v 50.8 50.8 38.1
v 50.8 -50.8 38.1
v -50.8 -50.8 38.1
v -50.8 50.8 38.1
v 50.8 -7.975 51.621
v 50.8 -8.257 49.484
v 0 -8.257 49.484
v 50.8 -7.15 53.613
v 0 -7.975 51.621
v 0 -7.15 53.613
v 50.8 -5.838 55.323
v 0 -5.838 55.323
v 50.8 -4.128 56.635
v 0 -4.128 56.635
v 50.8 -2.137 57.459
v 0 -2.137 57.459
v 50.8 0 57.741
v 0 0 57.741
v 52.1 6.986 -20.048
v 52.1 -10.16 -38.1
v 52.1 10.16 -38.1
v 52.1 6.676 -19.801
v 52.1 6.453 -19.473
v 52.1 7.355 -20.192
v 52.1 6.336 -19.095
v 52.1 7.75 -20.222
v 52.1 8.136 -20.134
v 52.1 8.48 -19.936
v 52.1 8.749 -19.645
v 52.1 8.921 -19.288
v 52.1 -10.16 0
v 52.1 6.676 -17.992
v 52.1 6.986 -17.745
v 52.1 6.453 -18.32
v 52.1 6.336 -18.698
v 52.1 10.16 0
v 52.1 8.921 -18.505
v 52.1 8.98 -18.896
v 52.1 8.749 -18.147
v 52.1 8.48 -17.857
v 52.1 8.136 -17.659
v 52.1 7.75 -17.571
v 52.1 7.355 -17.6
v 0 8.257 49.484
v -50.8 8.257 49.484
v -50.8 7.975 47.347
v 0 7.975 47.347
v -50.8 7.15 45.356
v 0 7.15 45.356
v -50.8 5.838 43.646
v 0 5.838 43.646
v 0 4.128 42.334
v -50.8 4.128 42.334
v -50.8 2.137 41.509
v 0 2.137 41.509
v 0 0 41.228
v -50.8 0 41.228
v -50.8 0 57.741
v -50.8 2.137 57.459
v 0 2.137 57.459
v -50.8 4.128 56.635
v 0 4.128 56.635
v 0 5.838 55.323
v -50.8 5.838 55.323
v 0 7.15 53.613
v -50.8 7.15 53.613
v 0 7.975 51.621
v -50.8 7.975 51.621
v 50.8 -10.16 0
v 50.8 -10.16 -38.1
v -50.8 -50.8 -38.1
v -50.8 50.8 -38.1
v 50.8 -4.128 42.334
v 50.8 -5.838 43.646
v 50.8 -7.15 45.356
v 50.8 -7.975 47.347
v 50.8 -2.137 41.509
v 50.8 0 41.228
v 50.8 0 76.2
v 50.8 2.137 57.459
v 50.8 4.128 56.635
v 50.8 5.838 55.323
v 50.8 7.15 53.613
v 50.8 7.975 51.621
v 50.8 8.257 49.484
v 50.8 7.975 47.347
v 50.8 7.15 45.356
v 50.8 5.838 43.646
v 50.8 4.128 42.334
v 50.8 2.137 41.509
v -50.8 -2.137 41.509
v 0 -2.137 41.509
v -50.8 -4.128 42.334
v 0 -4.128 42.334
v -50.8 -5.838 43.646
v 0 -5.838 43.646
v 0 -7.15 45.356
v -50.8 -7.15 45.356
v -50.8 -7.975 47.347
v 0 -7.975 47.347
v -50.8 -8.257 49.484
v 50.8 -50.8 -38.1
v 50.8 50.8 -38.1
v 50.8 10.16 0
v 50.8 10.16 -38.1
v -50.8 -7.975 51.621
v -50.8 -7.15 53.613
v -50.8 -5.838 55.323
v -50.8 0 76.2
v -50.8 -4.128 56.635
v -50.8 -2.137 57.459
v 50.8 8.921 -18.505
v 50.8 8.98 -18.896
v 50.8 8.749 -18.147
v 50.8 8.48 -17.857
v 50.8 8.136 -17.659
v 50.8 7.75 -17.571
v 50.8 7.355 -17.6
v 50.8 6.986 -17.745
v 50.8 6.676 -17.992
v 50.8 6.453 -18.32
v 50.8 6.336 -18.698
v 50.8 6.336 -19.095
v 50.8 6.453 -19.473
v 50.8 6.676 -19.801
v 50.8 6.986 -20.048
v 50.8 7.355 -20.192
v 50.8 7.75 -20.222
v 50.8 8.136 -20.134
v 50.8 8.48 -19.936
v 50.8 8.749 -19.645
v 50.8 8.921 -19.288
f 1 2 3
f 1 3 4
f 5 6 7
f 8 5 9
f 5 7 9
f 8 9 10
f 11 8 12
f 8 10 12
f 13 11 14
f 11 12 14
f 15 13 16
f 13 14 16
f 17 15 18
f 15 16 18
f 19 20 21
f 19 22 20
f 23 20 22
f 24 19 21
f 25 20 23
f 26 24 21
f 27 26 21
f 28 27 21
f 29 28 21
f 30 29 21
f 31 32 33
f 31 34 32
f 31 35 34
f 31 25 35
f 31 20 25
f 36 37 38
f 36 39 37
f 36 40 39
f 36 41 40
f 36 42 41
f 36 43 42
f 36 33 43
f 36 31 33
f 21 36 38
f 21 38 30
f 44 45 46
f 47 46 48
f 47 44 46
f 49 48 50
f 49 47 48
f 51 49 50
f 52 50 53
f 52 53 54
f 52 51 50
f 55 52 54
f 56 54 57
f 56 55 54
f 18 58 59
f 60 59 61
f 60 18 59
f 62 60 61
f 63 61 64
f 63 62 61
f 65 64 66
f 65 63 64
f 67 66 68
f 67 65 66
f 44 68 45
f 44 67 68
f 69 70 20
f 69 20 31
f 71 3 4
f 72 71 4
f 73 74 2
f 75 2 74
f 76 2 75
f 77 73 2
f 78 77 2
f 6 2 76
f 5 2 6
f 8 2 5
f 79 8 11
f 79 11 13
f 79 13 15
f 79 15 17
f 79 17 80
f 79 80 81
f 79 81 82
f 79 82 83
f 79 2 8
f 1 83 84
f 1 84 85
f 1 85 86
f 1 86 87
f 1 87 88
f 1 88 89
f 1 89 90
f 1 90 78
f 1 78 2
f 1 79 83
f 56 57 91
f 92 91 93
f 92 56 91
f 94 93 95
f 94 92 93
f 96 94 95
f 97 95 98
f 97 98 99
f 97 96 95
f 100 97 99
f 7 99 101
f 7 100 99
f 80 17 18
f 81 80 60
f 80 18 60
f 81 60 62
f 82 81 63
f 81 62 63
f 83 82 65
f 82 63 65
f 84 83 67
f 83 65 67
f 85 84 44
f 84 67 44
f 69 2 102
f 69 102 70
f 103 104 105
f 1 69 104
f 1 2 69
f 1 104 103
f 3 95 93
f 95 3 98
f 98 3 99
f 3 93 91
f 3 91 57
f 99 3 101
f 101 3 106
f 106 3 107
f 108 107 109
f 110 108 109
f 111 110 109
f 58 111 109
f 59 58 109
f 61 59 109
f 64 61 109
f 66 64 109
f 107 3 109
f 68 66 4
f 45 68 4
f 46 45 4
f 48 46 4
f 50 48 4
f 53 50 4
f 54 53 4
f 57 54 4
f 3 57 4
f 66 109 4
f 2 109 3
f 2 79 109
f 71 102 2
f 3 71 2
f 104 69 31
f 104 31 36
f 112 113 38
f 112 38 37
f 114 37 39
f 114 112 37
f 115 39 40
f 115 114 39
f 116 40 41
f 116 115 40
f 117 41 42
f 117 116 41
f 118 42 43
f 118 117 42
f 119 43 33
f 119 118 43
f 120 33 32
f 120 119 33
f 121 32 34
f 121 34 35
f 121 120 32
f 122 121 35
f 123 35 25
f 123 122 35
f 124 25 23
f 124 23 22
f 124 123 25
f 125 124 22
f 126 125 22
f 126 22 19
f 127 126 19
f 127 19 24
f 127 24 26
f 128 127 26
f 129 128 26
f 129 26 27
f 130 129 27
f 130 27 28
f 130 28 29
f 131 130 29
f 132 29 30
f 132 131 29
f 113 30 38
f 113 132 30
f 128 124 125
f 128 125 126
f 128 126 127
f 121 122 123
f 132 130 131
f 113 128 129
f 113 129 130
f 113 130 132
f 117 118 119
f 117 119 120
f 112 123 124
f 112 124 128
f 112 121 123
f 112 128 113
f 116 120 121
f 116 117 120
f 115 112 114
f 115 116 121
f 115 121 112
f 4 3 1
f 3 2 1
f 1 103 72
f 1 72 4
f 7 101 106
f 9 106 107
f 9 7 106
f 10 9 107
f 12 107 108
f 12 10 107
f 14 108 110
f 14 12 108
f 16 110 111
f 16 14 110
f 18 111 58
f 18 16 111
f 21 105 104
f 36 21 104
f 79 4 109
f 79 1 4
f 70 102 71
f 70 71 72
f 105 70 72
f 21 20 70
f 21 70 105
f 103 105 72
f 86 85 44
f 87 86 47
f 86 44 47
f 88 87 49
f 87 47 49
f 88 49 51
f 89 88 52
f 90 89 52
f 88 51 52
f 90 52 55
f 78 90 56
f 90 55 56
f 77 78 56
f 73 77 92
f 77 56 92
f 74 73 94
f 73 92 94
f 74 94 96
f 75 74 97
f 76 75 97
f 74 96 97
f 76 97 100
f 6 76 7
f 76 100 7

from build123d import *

# Parameters (mm, degrees)
F0_W          = 101.6
F0_H          = 76.2
F2_DEPTH      = 50.8
F2_DEPTH_BACK = 50.8
F3_W          = 20.32
F3_H          = 38.1
F3_R          = 1.3294008676
F4_DEPTH      = 1.30048


with BuildPart() as f2:
    # F0 (on Right) → F2 (new body, two sides)
    with BuildSketch(Plane.YZ) as f2_sk:
        Rectangle(F0_W, F0_H)
    extrude(amount=F2_DEPTH)
    extrude(f2_sk.sketch, amount=-F2_DEPTH_BACK)

    # F3 (on face) → F4 (join)
    with BuildSketch(Plane.YZ.offset(50.8)):
        with Locations((0, -19.05)):
            Rectangle(F3_W, F3_H)
        with Locations((7.6507260092, -18.8963711262)):
            Circle(F3_R, mode=Mode.SUBTRACT)
    extrude(amount=F4_DEPTH)


with BuildPart() as f2b:
    # F1 (on face) → F2, piece 2 (new body, two sides)
    with BuildSketch(Plane.YZ) as f2_2_sk:
        Polygon((0, 76.2), (-50.8, 38.1), (50.8, 38.1), align=None)
        with BuildLine():
            ThreePointArc((0, 57.7408315491), (5.8382487534, 55.3225497349), (8.2565305675, 49.4843009816))
            ThreePointArc((8.2565305675, 49.4843009816), (5.8382487534, 43.6460522282), (0, 41.2277704141))
            ThreePointArc((0, 41.2277704141), (-5.8382487534, 43.6460522282), (-8.2565305675, 49.4843009816))
            ThreePointArc((-8.2565305675, 49.4843009816), (-5.8382487534, 55.3225497349), (0, 57.7408315491))
        make_face(mode=Mode.SUBTRACT)
    extrude(amount=F2_DEPTH)
    extrude(f2_2_sk.sketch, amount=-F2_DEPTH_BACK)


solid = Compound([f2.part, f2b.part])
